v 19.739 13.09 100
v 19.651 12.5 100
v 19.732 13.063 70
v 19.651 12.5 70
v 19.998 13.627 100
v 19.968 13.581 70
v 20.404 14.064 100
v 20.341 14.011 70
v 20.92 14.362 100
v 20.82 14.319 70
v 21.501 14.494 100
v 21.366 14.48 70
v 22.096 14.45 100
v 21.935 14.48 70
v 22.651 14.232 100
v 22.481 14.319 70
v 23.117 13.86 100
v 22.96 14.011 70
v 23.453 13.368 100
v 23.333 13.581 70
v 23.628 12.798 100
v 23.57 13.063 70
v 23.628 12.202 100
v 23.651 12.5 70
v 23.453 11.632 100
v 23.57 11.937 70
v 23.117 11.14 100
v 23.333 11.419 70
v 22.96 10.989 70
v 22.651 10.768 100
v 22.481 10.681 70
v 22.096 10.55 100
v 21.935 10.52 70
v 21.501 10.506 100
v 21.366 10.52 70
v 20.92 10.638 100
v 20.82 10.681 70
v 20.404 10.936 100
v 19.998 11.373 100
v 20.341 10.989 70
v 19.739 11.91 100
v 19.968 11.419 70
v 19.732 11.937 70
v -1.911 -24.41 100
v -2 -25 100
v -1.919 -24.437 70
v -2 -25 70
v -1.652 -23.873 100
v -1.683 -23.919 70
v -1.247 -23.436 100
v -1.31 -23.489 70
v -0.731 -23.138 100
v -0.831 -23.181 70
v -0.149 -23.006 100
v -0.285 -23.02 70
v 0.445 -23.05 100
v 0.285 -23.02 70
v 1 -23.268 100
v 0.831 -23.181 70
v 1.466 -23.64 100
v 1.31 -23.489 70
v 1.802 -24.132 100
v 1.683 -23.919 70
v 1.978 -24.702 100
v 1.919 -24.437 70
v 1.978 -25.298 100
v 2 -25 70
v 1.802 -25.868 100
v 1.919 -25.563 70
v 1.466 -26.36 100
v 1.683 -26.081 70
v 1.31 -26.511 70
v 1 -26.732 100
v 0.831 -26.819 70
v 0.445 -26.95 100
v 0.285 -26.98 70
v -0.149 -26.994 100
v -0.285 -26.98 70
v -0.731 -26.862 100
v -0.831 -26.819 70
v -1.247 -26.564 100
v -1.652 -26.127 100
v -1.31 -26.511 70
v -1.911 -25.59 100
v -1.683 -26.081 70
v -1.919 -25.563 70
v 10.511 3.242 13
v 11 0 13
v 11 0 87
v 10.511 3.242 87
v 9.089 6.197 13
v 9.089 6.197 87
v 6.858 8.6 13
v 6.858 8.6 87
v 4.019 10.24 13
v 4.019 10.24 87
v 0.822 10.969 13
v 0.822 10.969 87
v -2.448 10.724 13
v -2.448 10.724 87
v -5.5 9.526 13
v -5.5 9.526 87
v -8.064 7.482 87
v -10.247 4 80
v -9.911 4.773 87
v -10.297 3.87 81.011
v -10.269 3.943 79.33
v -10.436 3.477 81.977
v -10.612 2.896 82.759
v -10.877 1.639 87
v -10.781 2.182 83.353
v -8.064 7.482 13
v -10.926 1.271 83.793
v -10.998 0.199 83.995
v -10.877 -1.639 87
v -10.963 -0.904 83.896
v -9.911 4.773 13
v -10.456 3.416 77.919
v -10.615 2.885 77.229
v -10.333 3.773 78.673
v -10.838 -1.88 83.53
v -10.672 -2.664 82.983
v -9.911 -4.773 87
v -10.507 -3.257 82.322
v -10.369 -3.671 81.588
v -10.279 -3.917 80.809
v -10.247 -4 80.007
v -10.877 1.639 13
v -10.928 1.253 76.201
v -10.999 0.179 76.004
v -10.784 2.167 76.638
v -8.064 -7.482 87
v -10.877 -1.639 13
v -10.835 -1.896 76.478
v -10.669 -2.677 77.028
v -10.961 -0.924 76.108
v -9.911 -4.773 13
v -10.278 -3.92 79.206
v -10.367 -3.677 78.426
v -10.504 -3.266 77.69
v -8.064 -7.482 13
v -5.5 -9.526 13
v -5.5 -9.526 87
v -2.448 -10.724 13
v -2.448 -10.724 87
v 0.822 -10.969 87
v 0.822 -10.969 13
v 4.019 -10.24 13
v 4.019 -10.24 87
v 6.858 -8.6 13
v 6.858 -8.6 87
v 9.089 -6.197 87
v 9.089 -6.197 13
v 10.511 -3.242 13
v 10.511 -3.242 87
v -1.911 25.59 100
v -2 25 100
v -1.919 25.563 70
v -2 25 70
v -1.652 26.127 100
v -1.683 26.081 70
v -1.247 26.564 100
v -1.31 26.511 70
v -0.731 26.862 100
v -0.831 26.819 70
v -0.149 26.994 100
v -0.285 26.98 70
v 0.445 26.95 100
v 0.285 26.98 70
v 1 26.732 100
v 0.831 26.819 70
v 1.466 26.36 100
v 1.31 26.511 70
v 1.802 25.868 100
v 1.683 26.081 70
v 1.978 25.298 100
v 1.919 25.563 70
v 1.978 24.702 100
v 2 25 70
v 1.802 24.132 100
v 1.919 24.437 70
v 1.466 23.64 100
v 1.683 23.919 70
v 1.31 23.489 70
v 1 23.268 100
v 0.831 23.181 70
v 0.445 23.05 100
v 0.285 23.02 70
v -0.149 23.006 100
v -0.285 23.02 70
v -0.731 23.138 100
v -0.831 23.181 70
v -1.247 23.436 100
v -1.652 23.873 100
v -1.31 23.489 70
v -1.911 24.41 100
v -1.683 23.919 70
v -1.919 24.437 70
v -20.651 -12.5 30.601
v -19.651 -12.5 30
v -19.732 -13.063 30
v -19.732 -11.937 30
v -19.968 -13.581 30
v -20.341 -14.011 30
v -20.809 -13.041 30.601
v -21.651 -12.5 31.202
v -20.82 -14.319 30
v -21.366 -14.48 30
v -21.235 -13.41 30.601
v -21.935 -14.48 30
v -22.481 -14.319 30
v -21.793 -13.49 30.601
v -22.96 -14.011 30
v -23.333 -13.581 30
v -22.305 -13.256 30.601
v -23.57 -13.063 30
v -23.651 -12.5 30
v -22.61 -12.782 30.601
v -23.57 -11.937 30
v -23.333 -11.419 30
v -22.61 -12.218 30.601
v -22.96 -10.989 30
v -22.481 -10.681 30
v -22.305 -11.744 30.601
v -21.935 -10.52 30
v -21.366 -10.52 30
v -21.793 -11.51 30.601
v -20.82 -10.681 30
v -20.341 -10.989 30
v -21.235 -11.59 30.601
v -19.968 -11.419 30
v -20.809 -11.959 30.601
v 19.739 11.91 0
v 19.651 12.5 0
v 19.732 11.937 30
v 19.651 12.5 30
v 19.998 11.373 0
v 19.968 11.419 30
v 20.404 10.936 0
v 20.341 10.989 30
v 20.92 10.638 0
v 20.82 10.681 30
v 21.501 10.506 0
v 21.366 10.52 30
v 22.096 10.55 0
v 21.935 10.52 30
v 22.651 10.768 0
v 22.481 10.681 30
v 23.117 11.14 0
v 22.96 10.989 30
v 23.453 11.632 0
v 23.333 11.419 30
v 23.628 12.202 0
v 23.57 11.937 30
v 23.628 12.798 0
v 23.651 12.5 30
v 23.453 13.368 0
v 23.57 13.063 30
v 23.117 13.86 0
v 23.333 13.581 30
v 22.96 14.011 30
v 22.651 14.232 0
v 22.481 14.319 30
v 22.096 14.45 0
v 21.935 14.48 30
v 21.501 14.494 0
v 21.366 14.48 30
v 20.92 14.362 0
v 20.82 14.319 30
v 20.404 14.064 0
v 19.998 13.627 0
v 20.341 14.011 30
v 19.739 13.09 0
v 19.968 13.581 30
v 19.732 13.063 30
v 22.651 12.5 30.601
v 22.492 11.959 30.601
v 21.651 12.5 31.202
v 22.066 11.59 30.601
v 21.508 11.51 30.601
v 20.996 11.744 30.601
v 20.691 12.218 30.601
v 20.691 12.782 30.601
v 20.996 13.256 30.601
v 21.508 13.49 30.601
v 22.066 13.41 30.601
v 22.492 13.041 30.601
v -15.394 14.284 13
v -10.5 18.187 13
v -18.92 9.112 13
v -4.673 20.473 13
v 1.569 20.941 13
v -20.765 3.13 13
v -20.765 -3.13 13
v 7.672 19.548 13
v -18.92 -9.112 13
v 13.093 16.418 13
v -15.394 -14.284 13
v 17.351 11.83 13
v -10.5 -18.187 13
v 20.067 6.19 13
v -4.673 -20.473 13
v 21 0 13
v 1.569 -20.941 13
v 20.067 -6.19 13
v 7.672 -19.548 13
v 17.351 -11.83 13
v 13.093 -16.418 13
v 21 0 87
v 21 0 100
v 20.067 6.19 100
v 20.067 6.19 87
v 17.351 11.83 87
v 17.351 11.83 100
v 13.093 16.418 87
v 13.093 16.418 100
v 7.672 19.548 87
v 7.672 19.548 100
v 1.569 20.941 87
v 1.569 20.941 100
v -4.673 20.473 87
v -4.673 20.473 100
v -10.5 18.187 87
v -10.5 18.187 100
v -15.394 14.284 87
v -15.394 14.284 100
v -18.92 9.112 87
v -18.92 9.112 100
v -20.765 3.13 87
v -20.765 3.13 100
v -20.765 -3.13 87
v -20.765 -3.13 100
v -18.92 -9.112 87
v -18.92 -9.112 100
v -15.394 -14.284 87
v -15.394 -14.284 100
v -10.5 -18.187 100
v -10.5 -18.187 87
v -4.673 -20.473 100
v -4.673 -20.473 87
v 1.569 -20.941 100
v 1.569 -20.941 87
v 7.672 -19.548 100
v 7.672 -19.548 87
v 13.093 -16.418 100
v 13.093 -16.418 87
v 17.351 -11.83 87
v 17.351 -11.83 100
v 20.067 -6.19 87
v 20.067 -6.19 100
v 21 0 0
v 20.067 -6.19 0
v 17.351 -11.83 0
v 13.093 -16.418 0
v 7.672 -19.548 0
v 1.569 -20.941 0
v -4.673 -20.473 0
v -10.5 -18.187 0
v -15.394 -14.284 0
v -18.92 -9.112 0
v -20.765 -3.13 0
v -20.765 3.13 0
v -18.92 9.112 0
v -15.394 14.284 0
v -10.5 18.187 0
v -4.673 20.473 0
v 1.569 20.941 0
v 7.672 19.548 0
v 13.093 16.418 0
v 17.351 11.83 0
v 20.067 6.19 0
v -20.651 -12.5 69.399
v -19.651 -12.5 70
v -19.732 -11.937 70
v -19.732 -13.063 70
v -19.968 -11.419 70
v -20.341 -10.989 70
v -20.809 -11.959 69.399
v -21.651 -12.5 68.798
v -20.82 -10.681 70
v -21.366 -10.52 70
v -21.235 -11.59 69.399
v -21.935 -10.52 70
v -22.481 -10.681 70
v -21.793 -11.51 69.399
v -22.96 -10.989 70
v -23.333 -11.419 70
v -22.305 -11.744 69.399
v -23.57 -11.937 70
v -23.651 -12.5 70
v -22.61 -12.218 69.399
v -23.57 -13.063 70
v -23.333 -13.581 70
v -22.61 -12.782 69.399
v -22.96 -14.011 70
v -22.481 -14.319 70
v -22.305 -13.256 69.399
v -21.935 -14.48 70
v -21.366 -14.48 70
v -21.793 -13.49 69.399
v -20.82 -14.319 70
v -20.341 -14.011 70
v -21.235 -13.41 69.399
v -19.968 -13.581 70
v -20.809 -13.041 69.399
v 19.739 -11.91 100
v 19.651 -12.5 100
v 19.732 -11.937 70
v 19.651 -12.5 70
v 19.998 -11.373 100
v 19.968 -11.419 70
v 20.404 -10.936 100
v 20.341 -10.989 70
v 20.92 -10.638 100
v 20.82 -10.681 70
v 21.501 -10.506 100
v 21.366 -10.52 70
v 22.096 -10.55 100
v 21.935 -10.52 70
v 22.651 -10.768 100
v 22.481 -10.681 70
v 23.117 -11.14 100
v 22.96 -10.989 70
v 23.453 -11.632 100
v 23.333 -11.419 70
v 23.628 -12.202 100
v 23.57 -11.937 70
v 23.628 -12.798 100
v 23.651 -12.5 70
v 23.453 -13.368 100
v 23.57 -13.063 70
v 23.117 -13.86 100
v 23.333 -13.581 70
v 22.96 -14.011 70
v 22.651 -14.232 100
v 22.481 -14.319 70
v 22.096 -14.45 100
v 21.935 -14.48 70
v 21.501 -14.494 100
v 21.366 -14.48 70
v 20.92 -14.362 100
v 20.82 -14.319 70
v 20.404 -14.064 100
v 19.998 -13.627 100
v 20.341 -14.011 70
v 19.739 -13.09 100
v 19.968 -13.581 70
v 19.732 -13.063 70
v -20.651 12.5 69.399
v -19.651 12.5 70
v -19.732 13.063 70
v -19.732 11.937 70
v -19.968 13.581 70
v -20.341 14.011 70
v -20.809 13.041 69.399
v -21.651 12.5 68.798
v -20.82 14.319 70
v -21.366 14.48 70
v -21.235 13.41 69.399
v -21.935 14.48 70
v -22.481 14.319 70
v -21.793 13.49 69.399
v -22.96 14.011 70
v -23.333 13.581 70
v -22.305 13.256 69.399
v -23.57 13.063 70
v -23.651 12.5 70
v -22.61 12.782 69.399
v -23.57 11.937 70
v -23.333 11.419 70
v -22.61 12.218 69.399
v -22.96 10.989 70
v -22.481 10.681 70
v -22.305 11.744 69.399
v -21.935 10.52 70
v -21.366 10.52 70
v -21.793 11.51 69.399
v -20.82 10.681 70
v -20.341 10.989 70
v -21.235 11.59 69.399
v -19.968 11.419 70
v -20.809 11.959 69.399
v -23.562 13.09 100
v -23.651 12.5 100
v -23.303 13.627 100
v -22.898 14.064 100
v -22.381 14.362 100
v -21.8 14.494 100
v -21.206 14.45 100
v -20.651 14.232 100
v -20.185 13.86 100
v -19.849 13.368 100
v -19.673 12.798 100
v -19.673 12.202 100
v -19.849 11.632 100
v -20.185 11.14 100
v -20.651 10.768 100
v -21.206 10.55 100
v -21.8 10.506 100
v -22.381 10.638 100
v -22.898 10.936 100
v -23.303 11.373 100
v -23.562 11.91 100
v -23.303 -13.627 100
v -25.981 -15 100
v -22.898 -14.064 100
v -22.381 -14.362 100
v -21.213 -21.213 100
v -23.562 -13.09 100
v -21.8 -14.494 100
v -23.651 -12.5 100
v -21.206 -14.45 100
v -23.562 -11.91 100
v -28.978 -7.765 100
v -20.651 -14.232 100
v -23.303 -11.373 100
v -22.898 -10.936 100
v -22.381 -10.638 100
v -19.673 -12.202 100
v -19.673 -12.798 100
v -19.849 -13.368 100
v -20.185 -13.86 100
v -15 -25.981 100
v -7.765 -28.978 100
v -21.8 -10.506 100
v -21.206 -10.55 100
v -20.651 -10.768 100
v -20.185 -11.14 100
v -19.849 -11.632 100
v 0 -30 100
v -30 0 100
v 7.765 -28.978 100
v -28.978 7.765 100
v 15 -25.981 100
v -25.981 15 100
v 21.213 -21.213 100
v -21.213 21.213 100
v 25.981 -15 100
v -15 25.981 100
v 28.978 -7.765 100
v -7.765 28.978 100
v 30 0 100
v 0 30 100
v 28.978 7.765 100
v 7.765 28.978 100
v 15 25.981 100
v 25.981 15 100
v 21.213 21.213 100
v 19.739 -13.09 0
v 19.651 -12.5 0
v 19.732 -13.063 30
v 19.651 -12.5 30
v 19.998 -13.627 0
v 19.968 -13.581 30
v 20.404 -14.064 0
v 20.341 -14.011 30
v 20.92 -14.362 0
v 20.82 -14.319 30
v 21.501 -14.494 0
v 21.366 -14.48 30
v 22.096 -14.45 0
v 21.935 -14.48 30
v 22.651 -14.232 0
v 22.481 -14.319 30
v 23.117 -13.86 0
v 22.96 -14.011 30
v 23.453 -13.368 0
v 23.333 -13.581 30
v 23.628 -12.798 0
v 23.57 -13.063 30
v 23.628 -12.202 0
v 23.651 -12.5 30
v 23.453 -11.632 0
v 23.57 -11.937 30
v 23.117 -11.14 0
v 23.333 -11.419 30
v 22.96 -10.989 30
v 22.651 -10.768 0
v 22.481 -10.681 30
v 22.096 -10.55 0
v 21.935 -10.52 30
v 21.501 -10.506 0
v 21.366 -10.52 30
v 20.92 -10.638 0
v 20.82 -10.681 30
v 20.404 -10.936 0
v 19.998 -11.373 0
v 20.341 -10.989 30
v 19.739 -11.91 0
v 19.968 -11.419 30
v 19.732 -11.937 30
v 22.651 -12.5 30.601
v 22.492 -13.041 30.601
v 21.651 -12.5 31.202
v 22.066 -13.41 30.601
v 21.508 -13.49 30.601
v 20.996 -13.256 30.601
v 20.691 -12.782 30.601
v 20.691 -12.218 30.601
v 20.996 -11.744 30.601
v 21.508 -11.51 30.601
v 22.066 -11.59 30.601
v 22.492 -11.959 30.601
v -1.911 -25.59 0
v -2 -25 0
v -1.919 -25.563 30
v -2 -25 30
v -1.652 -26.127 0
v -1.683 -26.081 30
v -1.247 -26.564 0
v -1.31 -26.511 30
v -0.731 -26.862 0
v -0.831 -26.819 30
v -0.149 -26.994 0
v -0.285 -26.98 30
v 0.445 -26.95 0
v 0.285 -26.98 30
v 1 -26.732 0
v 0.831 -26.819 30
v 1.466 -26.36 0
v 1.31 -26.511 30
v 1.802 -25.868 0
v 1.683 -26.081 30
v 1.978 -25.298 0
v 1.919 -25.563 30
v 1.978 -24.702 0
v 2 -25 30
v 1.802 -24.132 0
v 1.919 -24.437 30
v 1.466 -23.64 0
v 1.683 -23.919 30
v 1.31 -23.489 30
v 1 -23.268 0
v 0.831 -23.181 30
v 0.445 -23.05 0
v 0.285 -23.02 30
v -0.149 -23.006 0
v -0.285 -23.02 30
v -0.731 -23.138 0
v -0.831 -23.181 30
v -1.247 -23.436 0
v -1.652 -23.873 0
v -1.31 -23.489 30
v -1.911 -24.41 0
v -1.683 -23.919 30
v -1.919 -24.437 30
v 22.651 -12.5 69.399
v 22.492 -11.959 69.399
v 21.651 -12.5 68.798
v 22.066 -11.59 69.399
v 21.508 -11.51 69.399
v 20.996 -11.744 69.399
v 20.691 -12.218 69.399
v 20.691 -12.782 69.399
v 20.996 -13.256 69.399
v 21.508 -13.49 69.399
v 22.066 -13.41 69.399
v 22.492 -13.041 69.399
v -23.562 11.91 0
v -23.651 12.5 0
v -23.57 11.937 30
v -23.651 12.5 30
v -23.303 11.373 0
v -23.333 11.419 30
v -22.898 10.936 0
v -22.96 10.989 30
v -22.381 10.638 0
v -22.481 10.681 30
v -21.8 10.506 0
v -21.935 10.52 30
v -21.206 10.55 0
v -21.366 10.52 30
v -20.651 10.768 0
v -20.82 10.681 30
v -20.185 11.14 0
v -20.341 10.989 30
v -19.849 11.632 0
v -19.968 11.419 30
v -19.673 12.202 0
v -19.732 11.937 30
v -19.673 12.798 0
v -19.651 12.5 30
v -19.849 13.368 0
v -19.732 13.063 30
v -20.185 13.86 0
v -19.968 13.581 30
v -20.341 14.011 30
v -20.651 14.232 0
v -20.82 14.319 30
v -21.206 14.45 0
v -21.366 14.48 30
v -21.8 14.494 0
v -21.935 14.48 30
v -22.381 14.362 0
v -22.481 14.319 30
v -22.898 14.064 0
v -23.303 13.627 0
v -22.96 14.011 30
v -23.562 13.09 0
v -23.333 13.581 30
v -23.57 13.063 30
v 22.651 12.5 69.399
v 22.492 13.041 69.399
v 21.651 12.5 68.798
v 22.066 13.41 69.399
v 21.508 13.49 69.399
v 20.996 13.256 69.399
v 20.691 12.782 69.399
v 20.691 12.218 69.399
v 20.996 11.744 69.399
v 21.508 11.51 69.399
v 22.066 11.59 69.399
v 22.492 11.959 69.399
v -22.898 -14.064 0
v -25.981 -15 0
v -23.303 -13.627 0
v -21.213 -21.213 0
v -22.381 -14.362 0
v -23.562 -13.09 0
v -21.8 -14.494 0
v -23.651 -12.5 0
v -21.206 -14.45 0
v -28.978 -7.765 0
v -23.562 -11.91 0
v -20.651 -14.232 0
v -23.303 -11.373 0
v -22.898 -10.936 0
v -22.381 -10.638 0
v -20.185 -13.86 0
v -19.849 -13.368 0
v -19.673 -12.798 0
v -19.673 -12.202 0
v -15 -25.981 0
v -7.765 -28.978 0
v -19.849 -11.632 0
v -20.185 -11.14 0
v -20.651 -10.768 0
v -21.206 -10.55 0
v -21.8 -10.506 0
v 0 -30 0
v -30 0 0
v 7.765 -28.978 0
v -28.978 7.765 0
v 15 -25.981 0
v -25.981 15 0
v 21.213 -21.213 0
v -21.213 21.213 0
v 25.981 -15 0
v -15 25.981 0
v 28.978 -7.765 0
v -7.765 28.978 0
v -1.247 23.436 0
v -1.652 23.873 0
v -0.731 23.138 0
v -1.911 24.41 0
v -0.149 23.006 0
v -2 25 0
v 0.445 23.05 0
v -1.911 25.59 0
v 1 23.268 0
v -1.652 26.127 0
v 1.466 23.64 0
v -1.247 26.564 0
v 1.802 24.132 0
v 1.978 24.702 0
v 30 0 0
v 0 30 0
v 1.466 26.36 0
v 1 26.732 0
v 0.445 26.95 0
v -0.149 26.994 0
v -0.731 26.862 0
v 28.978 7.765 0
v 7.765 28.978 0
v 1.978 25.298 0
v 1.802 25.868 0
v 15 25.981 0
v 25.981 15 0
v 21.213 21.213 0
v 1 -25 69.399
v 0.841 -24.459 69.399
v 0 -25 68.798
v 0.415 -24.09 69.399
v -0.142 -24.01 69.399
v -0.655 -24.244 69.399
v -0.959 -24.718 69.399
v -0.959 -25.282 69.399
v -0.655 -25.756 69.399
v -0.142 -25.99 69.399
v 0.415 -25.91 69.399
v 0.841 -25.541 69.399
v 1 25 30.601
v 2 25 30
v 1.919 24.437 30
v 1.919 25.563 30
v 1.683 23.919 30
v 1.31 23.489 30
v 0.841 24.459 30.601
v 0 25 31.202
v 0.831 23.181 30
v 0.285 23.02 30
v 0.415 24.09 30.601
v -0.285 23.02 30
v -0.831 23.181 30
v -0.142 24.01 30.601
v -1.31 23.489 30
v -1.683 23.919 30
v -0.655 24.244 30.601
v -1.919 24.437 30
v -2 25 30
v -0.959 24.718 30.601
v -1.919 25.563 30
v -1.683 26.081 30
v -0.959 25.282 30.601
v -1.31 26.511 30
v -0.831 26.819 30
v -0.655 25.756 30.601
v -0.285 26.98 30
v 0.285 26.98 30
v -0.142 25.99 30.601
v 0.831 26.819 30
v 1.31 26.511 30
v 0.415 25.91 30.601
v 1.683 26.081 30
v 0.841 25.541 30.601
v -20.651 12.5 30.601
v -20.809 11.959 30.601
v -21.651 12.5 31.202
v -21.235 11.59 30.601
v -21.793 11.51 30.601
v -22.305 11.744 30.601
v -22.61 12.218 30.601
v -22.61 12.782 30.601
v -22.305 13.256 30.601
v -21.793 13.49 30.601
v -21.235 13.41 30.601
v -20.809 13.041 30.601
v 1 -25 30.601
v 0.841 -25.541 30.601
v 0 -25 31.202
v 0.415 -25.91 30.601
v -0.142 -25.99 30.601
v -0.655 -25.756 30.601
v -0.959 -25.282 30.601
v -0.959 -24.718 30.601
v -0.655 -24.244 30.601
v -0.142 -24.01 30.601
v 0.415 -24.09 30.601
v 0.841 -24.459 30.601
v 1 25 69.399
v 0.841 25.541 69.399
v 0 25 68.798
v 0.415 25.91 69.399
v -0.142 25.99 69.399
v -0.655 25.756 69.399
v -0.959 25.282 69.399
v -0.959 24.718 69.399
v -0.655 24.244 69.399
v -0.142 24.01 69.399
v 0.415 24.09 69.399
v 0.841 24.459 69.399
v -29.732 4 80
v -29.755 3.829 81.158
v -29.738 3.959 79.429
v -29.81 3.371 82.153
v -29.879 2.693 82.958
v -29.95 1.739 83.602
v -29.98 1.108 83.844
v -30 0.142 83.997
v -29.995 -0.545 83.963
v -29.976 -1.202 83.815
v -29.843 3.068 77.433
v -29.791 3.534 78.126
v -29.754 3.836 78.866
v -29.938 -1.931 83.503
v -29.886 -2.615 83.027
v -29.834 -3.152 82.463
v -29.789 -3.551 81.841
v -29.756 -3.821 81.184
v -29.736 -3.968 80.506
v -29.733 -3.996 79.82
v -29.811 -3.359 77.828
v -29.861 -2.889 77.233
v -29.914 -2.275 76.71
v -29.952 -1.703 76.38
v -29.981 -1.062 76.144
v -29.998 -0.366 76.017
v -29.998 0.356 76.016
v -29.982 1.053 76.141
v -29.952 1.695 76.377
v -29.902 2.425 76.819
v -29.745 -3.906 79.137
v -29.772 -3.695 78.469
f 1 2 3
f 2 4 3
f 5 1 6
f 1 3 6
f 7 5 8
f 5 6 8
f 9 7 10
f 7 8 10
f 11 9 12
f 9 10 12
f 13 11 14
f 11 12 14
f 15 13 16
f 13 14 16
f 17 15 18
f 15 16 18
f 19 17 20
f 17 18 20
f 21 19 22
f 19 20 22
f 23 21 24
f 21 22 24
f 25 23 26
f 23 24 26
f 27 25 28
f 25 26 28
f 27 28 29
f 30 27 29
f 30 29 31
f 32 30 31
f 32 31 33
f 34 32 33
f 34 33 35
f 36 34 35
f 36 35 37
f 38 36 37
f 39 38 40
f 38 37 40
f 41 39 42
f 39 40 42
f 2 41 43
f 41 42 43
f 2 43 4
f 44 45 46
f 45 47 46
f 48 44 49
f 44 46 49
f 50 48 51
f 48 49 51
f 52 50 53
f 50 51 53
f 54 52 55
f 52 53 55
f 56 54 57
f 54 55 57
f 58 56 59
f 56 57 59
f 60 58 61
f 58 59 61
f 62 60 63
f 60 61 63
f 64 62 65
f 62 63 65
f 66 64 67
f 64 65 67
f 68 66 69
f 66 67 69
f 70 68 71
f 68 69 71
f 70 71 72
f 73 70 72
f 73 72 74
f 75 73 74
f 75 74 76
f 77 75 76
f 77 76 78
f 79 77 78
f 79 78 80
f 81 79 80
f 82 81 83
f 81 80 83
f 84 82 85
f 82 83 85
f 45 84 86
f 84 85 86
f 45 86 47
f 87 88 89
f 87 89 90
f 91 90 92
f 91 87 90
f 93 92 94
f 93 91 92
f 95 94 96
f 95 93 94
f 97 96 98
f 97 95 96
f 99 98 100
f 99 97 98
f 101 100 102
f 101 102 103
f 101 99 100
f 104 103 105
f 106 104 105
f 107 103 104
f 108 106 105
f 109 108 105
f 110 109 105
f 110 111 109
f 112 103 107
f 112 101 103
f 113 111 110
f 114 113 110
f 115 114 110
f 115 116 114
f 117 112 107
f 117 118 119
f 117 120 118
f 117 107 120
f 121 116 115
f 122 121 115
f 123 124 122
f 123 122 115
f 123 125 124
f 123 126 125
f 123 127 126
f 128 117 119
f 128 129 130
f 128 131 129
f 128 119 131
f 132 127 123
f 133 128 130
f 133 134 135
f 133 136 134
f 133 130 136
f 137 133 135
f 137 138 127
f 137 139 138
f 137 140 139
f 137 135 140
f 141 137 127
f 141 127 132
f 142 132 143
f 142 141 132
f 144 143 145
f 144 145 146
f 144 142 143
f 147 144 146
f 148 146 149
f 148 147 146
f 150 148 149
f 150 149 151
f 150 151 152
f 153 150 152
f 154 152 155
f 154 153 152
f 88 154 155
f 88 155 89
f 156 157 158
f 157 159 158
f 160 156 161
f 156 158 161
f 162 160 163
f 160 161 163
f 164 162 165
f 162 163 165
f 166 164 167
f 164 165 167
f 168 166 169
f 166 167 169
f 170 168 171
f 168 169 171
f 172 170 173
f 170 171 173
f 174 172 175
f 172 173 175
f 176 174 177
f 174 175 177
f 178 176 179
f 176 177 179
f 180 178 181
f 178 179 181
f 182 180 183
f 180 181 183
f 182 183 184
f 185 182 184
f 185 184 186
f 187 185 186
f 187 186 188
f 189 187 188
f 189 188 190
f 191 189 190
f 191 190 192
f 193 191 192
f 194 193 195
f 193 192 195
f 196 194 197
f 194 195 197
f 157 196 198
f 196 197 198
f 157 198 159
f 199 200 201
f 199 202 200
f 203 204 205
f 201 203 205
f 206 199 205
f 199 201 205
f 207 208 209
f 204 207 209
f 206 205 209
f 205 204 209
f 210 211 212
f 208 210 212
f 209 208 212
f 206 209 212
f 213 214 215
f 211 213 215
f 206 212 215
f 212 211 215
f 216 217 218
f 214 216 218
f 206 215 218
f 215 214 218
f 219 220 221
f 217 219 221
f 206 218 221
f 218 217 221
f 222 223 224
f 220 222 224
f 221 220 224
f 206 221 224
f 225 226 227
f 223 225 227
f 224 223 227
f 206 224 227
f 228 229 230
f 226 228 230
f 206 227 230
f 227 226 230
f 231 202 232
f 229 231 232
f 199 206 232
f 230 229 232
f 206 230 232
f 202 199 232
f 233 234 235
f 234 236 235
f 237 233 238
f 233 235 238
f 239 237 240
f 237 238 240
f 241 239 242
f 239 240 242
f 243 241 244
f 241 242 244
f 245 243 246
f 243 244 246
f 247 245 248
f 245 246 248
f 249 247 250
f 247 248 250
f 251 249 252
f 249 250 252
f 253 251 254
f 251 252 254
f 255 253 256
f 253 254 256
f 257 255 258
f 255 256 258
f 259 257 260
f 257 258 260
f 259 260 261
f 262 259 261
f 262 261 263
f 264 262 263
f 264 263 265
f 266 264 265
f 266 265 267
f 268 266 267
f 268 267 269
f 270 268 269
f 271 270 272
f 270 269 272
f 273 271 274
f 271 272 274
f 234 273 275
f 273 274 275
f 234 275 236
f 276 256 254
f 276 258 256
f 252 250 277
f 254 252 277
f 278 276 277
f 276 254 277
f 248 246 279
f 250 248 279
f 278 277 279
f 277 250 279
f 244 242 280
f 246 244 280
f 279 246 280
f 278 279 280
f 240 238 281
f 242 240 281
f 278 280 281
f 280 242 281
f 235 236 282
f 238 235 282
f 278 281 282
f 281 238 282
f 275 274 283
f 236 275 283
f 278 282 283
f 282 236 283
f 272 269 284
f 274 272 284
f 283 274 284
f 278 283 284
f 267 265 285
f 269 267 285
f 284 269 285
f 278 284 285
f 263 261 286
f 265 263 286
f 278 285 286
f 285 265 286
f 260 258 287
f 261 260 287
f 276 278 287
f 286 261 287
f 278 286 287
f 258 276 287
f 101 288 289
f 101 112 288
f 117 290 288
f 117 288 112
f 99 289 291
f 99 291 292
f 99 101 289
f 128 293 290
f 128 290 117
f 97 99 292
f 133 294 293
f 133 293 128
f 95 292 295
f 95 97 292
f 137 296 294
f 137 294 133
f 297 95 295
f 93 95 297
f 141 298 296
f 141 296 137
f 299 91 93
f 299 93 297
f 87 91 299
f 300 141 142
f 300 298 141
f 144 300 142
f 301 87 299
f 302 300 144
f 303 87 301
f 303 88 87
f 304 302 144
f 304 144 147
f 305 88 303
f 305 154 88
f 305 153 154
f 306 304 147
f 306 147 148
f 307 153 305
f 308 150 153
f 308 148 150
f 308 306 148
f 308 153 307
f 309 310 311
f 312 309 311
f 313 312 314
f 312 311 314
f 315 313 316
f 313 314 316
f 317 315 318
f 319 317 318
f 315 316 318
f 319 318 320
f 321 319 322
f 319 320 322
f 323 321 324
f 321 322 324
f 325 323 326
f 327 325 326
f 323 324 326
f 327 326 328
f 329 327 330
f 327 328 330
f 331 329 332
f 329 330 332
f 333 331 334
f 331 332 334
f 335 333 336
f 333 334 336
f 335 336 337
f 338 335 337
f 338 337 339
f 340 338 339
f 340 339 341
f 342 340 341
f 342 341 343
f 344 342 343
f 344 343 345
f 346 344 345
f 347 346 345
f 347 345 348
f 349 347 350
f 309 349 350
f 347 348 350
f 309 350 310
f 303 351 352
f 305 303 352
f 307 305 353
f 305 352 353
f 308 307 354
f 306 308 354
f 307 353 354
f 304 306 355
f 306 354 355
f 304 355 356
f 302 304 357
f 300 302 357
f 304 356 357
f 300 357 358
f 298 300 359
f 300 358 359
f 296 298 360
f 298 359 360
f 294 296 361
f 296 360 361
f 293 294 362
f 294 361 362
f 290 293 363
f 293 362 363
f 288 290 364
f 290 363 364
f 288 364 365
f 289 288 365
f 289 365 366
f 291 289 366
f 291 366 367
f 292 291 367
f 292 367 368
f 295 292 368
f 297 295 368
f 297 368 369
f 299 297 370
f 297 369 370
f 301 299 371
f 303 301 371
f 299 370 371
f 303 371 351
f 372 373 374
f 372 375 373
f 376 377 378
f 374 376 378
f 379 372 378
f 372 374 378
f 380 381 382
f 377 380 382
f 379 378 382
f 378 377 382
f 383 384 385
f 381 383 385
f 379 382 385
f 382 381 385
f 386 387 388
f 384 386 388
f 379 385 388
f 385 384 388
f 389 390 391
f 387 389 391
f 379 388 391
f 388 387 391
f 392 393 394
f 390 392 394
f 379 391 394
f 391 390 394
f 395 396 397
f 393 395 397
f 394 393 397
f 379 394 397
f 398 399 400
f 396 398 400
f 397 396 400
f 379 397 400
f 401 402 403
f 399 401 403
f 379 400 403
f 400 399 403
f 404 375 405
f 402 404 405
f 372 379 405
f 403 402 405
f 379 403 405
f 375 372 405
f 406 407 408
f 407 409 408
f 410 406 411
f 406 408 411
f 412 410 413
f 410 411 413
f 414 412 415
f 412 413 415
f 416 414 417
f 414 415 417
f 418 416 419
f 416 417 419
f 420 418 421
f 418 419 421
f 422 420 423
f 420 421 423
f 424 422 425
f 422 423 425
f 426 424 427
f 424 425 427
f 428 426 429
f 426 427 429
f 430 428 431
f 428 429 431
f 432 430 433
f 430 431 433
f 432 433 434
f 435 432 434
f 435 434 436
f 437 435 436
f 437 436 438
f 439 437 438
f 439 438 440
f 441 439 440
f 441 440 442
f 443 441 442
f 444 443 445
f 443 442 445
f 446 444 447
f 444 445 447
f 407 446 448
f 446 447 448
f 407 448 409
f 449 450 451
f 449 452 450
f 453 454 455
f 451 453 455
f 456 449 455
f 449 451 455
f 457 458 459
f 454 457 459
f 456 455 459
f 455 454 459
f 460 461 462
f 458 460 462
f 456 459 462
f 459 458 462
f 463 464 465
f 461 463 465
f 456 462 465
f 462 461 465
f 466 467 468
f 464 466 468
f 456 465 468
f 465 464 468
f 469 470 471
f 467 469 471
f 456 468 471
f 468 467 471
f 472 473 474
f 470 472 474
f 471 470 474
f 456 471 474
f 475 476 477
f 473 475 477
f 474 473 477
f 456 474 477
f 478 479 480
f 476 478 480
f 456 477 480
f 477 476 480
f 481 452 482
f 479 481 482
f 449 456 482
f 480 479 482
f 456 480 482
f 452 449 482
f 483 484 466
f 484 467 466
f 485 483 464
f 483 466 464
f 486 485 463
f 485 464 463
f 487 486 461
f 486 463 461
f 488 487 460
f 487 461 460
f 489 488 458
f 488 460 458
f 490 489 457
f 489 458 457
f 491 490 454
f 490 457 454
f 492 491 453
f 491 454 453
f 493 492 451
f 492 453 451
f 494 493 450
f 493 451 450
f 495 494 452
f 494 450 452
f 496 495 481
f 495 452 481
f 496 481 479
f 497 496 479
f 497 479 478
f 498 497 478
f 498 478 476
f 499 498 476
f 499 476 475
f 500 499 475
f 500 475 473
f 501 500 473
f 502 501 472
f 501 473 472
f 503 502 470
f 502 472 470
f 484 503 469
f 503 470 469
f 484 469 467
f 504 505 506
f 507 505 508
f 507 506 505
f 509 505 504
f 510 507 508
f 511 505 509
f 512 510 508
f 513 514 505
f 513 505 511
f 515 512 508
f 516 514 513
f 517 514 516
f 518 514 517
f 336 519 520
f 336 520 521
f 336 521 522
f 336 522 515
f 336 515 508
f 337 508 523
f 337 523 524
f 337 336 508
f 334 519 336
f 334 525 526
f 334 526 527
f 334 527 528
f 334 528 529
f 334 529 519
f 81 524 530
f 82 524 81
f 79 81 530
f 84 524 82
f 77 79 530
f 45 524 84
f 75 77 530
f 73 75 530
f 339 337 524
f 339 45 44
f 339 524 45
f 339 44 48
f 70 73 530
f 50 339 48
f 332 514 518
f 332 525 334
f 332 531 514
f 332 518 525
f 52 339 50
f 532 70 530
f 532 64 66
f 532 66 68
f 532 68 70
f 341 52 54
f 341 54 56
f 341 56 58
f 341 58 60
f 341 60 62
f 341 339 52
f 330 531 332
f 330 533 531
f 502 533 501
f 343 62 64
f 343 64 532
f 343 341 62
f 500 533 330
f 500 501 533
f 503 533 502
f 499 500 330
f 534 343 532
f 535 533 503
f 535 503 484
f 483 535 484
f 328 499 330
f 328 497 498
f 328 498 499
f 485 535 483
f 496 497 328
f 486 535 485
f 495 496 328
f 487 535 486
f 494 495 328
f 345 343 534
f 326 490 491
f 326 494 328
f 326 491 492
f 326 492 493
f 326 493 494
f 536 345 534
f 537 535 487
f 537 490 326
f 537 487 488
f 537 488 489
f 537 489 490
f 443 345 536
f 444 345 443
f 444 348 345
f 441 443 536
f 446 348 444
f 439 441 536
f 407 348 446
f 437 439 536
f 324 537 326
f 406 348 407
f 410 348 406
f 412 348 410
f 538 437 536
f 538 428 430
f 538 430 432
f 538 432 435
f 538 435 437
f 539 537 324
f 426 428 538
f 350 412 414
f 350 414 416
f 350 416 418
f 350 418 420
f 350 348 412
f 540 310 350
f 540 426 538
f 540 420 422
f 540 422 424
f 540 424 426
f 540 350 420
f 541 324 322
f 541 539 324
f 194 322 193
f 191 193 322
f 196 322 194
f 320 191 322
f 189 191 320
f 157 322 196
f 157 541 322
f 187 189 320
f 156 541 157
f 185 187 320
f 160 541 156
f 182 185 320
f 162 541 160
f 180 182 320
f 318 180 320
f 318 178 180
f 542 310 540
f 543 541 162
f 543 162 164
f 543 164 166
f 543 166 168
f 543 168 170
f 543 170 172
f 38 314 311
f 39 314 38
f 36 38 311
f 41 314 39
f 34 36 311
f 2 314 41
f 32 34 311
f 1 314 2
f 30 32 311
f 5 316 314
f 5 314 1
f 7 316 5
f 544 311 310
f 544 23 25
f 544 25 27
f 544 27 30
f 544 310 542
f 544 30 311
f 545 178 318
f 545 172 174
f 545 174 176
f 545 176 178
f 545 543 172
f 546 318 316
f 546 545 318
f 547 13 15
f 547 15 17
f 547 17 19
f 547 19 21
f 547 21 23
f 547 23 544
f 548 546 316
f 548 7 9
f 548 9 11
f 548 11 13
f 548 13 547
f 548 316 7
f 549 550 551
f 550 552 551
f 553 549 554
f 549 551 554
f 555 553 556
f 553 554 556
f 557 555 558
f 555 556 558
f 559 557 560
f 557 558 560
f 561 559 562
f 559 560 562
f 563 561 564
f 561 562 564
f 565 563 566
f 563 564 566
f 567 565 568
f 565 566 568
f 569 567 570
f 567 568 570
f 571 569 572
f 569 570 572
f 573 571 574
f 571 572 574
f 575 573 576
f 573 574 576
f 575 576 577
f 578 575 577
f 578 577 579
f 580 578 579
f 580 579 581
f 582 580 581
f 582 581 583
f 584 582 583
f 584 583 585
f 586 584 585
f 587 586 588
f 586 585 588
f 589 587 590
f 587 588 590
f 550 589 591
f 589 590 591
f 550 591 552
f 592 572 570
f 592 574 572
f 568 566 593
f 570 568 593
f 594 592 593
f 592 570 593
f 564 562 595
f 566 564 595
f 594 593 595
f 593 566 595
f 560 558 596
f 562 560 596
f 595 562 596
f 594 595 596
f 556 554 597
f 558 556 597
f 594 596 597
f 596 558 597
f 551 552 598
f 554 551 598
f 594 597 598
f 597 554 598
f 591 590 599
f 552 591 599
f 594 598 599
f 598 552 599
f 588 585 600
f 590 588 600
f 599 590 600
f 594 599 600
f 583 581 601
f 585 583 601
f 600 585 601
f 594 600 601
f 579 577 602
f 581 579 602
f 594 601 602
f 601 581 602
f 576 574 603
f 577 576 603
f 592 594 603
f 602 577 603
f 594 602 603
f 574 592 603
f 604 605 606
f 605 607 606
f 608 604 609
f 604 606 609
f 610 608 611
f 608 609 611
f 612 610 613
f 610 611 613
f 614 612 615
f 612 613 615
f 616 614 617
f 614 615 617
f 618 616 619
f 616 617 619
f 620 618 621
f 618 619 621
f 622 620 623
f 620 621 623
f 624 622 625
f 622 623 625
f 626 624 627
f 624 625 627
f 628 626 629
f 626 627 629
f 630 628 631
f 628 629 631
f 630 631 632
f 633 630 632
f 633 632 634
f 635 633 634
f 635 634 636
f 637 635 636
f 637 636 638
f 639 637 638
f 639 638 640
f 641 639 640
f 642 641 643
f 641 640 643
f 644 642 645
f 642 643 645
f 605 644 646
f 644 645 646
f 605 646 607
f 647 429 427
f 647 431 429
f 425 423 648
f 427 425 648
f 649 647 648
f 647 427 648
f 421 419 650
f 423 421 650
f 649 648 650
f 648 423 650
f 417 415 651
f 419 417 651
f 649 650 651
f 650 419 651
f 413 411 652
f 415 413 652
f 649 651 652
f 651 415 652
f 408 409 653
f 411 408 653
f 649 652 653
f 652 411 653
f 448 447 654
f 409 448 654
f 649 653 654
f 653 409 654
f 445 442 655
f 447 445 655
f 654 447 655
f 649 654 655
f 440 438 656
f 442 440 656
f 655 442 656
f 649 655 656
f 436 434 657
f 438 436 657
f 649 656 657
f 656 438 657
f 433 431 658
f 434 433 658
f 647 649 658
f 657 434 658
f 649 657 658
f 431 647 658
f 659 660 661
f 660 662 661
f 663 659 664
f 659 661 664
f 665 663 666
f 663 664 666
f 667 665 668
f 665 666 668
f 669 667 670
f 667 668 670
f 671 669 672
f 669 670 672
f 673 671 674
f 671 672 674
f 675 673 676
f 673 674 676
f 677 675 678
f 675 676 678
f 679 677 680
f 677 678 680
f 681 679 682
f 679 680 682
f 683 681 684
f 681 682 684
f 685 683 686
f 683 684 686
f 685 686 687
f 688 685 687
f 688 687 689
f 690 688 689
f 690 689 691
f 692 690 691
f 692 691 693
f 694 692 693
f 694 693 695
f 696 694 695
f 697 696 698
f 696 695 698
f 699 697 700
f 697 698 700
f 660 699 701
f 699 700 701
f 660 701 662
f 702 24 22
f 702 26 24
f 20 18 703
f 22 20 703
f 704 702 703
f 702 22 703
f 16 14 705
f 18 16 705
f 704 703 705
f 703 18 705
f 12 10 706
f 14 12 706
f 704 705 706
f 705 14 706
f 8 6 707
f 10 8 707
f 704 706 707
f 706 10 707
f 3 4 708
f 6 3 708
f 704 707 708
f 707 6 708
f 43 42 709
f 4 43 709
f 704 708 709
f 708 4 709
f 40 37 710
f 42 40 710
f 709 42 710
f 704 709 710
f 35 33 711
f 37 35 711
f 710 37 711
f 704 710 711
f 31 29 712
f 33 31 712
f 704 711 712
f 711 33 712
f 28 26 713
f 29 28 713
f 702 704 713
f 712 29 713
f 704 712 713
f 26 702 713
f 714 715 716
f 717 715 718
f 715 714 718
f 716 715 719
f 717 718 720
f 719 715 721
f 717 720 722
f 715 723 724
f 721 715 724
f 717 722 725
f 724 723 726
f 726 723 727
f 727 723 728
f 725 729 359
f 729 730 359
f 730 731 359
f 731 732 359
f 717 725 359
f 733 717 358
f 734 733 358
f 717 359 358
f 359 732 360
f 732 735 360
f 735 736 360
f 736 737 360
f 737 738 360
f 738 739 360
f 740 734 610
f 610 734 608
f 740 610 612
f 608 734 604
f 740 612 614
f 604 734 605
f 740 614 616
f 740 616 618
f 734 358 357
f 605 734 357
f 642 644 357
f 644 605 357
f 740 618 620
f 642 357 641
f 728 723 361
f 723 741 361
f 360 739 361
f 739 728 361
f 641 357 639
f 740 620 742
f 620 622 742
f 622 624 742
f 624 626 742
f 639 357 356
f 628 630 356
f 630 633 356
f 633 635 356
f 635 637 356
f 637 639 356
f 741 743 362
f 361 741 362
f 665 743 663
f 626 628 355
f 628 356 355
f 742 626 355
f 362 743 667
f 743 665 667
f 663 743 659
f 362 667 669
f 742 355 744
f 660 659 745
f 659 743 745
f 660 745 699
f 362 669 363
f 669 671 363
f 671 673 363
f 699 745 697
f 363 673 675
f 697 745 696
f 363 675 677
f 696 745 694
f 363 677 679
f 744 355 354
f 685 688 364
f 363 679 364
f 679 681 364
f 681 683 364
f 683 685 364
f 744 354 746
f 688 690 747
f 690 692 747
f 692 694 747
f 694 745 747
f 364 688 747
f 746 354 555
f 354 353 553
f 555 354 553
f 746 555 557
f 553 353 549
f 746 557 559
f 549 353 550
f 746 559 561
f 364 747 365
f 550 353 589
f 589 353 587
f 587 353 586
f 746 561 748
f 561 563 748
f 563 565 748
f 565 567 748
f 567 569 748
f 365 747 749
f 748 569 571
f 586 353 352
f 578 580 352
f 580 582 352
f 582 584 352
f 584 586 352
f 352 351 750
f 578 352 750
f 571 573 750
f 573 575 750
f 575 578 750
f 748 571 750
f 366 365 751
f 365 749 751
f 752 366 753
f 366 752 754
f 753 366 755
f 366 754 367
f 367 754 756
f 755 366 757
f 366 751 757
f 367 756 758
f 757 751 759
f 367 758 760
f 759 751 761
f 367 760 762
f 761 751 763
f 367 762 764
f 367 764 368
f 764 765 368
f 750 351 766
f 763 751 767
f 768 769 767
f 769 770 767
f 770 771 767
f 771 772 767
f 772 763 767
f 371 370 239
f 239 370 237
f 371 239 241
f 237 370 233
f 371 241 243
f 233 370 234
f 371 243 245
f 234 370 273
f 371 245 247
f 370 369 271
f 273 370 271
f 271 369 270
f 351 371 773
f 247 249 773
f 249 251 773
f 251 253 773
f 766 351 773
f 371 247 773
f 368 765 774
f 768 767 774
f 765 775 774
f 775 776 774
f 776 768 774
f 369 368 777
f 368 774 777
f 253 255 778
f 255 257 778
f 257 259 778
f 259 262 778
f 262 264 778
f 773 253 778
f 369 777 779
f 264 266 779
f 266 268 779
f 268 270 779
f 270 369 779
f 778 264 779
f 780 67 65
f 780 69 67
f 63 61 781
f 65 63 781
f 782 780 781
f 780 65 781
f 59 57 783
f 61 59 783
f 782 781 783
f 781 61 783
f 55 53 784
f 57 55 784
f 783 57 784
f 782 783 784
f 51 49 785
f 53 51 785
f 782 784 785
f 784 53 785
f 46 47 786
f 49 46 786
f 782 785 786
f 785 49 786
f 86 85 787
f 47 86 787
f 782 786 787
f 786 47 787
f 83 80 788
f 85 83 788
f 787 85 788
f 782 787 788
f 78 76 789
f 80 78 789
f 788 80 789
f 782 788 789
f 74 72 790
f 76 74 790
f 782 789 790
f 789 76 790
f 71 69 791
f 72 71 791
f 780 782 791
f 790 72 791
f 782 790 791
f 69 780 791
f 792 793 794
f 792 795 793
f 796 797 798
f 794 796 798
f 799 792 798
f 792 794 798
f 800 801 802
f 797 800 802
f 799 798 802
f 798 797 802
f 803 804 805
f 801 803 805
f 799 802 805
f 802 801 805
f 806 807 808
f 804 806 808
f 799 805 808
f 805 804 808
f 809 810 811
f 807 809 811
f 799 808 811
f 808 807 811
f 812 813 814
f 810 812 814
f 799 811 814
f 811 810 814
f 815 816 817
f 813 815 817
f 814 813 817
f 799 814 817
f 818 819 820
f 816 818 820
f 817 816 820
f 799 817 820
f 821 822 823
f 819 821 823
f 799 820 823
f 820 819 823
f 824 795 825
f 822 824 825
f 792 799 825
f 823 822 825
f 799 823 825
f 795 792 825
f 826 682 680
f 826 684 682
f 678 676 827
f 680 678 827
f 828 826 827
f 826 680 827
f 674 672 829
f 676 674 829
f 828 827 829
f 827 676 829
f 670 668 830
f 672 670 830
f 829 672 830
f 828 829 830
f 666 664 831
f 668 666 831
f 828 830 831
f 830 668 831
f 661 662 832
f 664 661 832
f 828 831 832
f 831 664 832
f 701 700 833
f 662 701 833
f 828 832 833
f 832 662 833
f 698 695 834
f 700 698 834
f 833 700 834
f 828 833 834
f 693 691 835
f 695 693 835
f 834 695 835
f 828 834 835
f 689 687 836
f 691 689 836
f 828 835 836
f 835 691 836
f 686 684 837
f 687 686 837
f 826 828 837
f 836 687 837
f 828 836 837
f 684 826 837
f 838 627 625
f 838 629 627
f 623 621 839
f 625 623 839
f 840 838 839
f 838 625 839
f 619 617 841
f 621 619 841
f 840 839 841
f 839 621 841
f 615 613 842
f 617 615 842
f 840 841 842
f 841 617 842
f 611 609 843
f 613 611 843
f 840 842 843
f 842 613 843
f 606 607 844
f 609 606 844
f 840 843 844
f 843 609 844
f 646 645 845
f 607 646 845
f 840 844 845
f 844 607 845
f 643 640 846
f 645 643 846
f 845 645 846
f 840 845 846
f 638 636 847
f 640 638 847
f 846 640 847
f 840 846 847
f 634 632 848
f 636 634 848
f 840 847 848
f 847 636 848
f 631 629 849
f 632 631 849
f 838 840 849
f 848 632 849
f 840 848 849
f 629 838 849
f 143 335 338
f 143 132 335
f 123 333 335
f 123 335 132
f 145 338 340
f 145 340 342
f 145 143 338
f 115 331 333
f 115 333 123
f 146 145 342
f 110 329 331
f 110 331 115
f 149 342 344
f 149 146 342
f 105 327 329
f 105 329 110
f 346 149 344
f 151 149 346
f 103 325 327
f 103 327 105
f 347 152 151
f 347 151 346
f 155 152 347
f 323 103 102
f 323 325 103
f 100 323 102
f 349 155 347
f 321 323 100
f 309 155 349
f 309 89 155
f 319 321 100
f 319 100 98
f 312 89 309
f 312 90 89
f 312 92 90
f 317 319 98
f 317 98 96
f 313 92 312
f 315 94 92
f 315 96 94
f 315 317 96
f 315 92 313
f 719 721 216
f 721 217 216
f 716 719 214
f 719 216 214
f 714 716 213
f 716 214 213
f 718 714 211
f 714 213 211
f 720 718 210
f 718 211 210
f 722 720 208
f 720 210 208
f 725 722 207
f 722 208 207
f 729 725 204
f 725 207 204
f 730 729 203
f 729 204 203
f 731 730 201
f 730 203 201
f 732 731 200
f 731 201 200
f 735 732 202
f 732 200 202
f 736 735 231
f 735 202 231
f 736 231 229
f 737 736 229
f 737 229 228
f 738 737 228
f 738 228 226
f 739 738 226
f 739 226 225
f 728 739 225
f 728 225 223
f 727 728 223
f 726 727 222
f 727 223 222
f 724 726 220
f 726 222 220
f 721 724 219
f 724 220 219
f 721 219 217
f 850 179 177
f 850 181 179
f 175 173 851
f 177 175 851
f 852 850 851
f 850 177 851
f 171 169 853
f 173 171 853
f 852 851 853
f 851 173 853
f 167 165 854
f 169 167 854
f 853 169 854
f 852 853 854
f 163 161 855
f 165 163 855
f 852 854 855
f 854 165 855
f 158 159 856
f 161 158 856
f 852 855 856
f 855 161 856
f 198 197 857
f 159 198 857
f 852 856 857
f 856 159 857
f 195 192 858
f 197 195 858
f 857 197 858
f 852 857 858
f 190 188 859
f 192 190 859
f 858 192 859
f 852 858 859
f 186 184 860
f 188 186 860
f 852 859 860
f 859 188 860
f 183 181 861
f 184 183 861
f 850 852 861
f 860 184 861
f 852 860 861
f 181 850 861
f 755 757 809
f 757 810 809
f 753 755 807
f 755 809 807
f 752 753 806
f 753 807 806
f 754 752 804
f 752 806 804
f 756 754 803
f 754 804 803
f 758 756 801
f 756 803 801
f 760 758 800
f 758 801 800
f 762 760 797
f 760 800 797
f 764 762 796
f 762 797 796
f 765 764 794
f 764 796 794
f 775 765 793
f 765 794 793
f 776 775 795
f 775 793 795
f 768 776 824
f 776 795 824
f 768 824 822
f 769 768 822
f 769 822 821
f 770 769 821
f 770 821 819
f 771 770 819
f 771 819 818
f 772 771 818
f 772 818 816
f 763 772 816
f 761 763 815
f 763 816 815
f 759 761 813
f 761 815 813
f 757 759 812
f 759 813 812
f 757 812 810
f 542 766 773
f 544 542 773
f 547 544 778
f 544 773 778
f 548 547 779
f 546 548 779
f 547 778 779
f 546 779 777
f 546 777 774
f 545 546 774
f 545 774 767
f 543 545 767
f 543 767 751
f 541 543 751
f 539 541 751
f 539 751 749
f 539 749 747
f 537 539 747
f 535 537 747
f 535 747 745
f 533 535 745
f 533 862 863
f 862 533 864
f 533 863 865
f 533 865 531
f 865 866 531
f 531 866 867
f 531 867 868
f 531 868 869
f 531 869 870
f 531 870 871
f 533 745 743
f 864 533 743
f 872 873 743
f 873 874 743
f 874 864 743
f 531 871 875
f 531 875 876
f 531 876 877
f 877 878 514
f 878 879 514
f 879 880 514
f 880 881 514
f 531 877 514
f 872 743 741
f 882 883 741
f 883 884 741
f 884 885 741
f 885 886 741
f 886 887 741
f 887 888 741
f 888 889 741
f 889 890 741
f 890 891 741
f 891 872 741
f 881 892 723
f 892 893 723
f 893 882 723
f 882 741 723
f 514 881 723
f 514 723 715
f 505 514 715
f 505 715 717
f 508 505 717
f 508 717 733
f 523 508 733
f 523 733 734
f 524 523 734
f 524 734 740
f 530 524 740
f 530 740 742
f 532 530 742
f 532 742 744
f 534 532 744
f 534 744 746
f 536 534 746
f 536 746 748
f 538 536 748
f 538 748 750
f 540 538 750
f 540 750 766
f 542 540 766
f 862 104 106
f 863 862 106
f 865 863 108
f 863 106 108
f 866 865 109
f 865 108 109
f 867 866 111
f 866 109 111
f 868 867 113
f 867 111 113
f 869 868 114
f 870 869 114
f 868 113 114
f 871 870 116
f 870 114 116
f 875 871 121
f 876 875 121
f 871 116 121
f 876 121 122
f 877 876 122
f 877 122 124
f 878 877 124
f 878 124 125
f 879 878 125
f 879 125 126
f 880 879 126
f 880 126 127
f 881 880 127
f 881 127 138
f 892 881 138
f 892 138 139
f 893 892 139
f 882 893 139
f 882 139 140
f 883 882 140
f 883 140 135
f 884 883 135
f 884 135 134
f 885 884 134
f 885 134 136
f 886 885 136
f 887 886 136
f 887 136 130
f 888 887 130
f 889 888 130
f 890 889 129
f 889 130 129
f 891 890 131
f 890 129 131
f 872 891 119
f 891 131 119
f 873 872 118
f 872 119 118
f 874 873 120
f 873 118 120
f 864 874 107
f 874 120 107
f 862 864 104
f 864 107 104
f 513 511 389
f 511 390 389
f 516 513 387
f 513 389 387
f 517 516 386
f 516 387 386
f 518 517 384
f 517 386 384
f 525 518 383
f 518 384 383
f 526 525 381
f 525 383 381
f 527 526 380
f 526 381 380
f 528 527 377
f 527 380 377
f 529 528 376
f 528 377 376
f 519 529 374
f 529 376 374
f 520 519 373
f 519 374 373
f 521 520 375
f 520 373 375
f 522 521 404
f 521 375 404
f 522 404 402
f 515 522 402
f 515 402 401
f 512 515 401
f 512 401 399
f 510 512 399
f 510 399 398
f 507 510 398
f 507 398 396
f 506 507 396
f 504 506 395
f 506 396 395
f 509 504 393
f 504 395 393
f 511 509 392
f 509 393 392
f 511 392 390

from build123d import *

# Parameters (mm, degrees)
F0_R      = 30
F0_R_2    = 11
F1_DEPTH  = 100
F2_R      = 21
F2_R_2    = 11
F3_DEPTH  = 13
F4_R      = 21
F4_R_2    = 11
F5_DEPTH  = 13
F7_D      = 8
F7_DEPTH  = 30.001
F9_D      = 4
F9_DEPTH  = 30
F9_TIP    = 1.2017212381
F11_D     = 4
F11_DEPTH = 30
F11_TIP   = 1.2017212381


with BuildPart() as f1:
    # F0 (on Top) → F1 (new body)
    with BuildSketch(Plane.XY):
        Circle(F0_R)
        Circle(F0_R_2, mode=Mode.SUBTRACT)
    extrude(amount=F1_DEPTH)

    # F2 (on face) → F3 (cut)
    with BuildSketch(Plane.XY.offset(100)):
        Circle(F2_R)
        Circle(F2_R_2, mode=Mode.SUBTRACT)
    extrude(amount=-F3_DEPTH, mode=Mode.SUBTRACT)

    # F4 (on face) → F5 (cut)
    with BuildSketch(Plane(origin=(0, 0, 0), x_dir=(1, 0, 0), z_dir=(0, 0, -1))):
        Circle(F4_R)
        Circle(F4_R_2, mode=Mode.SUBTRACT)
    extrude(amount=-F5_DEPTH, mode=Mode.SUBTRACT)

    # F7 (through all, one way)
    with BuildSketch(Plane.YZ):
        with Locations((0, 80)):
            Circle(F7_D / 2)
    extrude(amount=-F7_DEPTH, mode=Mode.SUBTRACT)

    # F9
    with Locations(Plane.XY.offset(100)):
        with Locations((0, 25), (21.6506350946, 12.5), (21.6506350946, -12.5), (0, -25), (-21.6506350946, -12.5), (-21.6506350946, 12.5)):
            Hole(F9_D / 2, depth=F9_DEPTH)
            with Locations((0, 0, -(F9_DEPTH + F9_TIP / 2))):  # 118° drill point
                Cone(0, F9_D / 2, F9_TIP, mode=Mode.SUBTRACT)

    # F11
    with Locations(Plane(origin=(0, 0, 0), x_dir=(1, 0, 0), z_dir=(0, 0, -1))):
        with Locations((0, 25), (21.6506350946, 12.5), (21.6506350946, -12.5), (0, -25), (-21.6506350946, -12.5), (-21.6506350946, 12.5)):
            Hole(F11_D / 2, depth=F11_DEPTH)
            with Locations((0, 0, -(F11_DEPTH + F11_TIP / 2))):  # 118° drill point
                Cone(0, F11_D / 2, F11_TIP, mode=Mode.SUBTRACT)


solid = f1.part
